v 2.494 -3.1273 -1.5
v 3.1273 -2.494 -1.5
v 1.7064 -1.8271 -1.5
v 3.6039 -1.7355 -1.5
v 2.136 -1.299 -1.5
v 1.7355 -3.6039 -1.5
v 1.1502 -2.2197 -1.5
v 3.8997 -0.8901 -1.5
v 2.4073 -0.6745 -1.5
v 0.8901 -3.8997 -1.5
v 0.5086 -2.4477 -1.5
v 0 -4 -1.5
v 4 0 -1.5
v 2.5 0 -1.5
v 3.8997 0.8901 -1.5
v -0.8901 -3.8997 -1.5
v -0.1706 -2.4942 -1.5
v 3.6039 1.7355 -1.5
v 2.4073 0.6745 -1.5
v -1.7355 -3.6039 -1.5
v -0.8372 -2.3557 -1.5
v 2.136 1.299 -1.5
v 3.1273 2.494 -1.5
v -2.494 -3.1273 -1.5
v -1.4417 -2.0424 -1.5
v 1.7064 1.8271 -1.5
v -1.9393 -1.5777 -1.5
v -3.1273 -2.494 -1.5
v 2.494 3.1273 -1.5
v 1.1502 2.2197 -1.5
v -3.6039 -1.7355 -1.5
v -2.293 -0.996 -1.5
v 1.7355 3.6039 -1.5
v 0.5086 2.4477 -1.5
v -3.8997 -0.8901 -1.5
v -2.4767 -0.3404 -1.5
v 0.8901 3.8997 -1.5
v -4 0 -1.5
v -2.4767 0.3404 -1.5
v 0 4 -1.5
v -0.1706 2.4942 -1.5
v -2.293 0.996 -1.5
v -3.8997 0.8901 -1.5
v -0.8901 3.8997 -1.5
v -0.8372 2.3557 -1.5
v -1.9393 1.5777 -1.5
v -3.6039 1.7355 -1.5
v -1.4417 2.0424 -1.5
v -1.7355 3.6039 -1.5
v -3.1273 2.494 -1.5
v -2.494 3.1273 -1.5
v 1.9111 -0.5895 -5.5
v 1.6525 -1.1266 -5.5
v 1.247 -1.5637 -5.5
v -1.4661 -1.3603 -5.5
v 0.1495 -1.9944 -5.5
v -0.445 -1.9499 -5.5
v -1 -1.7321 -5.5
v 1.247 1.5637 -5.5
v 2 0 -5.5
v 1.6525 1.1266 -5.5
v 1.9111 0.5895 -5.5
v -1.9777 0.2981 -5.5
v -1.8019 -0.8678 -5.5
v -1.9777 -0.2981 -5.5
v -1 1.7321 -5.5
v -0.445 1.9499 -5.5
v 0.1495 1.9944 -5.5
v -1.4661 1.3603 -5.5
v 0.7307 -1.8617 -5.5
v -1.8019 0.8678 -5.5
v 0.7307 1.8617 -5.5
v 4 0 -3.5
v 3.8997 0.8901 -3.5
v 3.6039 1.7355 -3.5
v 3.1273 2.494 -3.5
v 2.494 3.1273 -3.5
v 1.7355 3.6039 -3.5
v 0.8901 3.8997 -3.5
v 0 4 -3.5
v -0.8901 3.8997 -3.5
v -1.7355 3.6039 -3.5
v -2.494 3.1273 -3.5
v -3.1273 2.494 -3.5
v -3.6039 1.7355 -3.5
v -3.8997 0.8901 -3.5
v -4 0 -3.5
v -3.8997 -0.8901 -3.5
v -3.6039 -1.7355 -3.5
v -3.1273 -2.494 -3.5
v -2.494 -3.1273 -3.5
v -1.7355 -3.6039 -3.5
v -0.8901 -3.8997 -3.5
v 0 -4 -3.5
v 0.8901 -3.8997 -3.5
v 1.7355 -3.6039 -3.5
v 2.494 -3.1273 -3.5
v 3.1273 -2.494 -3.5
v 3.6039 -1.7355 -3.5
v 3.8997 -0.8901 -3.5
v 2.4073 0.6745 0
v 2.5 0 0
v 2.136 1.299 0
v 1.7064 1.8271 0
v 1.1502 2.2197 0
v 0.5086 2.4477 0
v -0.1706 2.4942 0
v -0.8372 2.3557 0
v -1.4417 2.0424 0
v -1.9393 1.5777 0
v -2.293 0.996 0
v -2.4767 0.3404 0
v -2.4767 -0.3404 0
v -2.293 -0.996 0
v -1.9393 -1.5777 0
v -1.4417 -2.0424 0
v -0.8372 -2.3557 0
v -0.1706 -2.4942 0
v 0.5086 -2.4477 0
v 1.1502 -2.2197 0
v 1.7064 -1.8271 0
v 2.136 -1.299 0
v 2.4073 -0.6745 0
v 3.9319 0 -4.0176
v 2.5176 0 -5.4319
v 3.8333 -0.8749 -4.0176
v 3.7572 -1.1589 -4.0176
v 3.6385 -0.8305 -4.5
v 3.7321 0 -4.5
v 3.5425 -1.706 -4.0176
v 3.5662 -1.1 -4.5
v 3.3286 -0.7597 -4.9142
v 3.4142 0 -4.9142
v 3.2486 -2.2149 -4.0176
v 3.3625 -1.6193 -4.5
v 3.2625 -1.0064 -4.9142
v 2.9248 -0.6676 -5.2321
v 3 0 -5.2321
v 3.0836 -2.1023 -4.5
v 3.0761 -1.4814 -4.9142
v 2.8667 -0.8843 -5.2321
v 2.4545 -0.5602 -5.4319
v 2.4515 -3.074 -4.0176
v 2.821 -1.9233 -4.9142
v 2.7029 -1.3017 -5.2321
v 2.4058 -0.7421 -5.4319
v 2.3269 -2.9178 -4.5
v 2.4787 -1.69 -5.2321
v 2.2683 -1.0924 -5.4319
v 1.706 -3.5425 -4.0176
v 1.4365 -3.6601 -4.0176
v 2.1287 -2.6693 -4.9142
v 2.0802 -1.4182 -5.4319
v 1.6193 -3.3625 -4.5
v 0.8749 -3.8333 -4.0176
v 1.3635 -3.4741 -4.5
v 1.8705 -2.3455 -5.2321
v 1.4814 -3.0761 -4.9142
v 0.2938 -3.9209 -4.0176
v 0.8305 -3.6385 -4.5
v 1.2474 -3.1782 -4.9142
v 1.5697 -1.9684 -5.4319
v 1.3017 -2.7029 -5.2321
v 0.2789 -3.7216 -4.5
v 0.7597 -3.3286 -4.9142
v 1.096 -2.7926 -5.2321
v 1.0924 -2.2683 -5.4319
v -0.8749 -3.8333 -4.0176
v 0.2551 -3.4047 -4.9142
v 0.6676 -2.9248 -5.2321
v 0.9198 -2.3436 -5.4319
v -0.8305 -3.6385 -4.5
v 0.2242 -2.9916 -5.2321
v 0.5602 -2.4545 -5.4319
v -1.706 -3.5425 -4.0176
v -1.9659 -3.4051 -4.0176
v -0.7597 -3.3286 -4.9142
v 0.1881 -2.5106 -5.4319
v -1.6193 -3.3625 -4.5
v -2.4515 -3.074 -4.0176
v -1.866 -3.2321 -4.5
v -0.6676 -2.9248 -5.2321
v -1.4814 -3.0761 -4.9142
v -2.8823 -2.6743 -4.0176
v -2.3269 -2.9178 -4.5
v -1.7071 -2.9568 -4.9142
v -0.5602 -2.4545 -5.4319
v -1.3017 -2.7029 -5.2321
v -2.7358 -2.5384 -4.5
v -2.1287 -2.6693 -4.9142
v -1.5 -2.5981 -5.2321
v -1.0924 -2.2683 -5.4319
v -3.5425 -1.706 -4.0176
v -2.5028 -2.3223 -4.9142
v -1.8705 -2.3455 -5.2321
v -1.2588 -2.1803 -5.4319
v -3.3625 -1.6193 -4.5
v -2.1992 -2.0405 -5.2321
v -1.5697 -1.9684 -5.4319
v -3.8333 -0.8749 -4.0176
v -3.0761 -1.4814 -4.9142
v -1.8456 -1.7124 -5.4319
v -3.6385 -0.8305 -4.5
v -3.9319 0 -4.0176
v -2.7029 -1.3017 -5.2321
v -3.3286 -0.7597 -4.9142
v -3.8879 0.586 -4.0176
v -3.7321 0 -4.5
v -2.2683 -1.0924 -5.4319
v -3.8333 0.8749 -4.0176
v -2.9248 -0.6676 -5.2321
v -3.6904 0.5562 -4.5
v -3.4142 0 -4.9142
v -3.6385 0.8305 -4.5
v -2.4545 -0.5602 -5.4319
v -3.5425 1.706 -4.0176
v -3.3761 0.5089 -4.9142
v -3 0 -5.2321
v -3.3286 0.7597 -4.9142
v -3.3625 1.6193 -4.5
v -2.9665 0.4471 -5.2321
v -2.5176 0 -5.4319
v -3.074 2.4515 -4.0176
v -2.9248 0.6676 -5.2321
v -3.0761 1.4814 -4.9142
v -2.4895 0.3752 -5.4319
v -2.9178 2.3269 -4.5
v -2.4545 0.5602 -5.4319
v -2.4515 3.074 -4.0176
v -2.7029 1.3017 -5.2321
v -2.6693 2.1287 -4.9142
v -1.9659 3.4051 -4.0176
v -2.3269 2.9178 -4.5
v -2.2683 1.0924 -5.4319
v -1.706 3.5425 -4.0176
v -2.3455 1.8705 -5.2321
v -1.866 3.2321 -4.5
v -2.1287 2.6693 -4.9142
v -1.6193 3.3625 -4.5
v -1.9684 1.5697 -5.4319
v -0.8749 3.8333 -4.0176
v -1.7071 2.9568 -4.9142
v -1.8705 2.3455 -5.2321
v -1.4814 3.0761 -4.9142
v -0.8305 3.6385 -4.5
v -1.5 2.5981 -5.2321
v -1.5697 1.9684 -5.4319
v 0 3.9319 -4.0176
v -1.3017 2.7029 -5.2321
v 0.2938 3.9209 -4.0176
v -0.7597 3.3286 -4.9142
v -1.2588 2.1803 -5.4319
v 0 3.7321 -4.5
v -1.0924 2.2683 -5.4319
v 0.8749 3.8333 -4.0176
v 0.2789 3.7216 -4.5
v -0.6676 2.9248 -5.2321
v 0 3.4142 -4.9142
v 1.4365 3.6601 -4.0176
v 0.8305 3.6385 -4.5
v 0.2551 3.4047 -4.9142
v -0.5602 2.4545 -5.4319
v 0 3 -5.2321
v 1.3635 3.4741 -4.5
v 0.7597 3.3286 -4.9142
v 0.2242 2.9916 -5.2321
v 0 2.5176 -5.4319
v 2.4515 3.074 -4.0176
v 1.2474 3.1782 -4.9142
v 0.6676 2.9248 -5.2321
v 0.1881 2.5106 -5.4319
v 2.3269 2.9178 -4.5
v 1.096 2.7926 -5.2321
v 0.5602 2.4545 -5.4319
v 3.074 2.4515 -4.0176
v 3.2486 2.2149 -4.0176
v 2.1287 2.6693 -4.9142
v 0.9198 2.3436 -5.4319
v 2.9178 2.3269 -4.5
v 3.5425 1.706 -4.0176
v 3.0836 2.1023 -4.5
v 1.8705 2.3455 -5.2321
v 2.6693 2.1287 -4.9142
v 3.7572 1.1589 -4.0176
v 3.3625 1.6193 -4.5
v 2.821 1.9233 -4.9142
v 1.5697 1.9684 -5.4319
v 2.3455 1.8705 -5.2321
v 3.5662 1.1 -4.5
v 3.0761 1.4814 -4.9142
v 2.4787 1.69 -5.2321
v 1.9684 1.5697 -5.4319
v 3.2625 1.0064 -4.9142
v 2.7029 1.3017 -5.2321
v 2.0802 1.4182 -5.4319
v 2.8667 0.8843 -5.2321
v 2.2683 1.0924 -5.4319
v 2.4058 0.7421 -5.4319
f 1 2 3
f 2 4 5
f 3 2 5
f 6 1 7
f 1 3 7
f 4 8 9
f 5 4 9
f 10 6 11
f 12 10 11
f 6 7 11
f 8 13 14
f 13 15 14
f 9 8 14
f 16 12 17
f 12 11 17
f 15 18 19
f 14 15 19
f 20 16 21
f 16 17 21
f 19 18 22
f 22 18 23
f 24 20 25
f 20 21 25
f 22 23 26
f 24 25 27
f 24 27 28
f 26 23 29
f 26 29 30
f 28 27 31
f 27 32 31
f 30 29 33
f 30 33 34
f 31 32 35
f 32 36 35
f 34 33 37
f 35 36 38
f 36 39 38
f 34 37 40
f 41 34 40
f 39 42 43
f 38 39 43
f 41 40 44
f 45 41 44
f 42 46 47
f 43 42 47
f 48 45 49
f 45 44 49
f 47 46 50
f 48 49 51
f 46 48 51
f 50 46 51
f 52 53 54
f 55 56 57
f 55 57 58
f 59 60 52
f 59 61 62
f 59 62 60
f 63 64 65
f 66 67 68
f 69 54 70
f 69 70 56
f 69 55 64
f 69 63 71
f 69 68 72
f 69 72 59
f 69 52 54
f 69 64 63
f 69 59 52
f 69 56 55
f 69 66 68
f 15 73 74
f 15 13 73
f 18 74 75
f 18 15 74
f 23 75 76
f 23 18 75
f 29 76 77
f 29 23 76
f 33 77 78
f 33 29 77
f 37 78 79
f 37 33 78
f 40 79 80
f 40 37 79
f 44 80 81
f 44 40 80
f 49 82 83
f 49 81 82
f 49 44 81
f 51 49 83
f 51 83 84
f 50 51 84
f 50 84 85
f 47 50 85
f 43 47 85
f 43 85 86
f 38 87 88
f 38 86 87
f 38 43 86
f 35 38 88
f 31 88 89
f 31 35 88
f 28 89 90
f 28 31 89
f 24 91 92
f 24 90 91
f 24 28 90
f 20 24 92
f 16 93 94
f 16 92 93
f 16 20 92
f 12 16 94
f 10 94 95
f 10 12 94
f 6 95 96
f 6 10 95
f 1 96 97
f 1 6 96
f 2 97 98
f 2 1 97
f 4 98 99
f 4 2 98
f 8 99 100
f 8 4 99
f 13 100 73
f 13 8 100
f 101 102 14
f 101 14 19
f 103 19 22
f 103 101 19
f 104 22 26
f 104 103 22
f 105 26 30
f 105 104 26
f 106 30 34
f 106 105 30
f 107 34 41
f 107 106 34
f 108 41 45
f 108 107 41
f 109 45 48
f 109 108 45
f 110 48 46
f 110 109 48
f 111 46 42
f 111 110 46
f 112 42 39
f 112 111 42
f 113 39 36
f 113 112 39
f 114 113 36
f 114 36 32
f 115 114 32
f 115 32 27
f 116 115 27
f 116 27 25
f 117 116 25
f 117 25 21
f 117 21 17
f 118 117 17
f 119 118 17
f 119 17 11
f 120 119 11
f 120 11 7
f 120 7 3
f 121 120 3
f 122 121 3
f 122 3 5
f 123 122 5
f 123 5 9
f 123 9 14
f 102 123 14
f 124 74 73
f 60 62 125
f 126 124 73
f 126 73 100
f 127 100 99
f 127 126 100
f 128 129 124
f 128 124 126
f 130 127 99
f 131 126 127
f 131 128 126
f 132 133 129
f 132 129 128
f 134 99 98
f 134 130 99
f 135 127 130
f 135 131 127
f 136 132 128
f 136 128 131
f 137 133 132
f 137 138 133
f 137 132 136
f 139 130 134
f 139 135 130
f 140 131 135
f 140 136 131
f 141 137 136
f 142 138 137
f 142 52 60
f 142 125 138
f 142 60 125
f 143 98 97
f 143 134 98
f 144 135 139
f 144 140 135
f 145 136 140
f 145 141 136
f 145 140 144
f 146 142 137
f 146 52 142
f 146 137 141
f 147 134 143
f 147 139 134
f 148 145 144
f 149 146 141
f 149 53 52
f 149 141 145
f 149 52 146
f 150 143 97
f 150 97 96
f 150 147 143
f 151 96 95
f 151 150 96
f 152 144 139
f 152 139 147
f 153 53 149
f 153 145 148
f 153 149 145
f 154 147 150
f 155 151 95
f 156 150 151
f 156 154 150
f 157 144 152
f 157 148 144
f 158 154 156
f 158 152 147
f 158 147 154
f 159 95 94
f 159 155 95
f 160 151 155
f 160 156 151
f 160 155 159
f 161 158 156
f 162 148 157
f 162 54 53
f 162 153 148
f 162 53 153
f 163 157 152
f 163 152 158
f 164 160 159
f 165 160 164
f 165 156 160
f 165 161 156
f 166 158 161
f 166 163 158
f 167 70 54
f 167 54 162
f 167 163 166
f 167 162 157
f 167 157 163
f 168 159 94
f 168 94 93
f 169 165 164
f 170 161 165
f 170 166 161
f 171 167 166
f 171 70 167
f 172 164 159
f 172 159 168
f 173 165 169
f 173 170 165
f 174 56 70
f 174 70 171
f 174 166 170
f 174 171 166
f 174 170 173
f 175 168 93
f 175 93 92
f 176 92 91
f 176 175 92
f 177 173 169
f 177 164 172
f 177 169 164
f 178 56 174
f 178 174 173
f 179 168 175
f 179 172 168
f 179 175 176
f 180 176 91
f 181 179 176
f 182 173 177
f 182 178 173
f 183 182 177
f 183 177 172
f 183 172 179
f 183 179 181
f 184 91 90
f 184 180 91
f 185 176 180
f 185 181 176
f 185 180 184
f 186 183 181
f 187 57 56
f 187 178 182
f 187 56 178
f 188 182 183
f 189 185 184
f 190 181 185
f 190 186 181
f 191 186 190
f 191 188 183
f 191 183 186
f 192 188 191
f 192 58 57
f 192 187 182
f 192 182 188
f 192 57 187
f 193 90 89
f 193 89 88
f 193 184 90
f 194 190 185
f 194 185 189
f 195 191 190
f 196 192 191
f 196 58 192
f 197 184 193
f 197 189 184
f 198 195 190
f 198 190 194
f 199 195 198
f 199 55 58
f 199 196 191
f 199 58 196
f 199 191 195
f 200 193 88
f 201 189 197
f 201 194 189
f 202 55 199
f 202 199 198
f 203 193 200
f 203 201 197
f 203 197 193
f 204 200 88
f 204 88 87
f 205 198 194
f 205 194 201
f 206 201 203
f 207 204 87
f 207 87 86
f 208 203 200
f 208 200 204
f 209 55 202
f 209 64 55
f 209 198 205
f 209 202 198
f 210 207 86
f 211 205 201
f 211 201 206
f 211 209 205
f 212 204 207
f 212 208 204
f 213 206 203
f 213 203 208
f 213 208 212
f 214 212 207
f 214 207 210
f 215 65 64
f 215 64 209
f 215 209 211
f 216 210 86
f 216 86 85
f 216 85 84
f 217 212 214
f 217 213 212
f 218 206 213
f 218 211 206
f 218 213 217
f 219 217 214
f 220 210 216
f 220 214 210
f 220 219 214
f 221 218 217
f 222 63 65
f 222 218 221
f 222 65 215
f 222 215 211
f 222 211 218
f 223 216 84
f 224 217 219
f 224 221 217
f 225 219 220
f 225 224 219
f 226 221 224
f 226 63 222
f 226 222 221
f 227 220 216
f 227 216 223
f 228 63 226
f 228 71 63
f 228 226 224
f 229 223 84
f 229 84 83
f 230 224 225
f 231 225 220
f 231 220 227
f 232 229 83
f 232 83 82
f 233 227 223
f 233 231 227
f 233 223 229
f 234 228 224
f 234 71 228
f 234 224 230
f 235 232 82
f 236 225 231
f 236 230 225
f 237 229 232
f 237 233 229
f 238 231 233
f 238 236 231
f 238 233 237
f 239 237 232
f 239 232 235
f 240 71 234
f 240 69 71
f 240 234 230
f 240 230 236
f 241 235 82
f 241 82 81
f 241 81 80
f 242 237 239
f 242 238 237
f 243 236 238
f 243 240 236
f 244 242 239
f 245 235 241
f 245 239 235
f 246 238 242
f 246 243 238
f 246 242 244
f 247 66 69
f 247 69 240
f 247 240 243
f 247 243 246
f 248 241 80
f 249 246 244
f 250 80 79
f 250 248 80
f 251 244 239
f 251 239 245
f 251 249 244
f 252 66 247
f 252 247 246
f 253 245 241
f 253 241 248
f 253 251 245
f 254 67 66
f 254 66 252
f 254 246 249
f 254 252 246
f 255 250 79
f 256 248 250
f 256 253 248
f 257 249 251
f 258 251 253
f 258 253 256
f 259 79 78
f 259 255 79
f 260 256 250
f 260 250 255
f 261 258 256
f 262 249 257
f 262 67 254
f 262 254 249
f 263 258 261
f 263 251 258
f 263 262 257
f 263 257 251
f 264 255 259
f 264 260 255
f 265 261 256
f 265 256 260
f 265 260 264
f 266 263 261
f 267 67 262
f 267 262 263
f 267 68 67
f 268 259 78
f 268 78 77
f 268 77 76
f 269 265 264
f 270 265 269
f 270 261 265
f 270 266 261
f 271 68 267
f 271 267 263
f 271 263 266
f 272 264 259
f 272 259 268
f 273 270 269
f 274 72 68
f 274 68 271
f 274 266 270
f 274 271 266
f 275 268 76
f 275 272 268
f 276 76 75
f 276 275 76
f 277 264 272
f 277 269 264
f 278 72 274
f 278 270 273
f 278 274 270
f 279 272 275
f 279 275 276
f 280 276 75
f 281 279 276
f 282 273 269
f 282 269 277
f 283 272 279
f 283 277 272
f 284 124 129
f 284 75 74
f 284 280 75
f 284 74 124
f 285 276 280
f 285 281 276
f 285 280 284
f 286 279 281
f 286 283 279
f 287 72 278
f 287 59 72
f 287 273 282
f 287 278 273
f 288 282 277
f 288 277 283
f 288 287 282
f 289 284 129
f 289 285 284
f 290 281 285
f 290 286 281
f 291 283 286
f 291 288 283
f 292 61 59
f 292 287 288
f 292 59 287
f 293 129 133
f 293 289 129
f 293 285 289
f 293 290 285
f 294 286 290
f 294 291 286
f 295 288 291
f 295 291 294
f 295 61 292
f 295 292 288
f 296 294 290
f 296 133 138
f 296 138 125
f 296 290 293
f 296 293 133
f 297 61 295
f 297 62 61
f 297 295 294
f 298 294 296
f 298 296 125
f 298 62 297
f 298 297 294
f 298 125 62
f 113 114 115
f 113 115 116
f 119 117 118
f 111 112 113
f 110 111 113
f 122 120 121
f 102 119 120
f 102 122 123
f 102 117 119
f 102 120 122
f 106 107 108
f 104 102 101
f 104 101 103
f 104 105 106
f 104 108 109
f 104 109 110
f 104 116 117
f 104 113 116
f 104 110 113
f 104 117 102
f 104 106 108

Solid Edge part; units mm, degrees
sketch "Sketch1" plane through (0, 0, 0) normal (0, 0, 1) x (1, 0, 0)
  circle A0 centre (0, 0) radius 2.5
  dimension "D1" = 5
extrude "Protrusion1" add sketch "Sketch1" against normal blind 1.5
sketch "Sketch2" plane through (0, 0, -1.5) normal (0, 0, -1) x (1, 0, 0)
  circle A0 centre (0, 0) radius 4
  dimension "D1" = 8
extrude "ExtrudedProtrusion_2" add sketch "Sketch2" along normal blind 4
fillet "Round_1" radius 2 1 edges at (-4, 0, -5.5)
properties material "ABS Plastic, medium impact"
